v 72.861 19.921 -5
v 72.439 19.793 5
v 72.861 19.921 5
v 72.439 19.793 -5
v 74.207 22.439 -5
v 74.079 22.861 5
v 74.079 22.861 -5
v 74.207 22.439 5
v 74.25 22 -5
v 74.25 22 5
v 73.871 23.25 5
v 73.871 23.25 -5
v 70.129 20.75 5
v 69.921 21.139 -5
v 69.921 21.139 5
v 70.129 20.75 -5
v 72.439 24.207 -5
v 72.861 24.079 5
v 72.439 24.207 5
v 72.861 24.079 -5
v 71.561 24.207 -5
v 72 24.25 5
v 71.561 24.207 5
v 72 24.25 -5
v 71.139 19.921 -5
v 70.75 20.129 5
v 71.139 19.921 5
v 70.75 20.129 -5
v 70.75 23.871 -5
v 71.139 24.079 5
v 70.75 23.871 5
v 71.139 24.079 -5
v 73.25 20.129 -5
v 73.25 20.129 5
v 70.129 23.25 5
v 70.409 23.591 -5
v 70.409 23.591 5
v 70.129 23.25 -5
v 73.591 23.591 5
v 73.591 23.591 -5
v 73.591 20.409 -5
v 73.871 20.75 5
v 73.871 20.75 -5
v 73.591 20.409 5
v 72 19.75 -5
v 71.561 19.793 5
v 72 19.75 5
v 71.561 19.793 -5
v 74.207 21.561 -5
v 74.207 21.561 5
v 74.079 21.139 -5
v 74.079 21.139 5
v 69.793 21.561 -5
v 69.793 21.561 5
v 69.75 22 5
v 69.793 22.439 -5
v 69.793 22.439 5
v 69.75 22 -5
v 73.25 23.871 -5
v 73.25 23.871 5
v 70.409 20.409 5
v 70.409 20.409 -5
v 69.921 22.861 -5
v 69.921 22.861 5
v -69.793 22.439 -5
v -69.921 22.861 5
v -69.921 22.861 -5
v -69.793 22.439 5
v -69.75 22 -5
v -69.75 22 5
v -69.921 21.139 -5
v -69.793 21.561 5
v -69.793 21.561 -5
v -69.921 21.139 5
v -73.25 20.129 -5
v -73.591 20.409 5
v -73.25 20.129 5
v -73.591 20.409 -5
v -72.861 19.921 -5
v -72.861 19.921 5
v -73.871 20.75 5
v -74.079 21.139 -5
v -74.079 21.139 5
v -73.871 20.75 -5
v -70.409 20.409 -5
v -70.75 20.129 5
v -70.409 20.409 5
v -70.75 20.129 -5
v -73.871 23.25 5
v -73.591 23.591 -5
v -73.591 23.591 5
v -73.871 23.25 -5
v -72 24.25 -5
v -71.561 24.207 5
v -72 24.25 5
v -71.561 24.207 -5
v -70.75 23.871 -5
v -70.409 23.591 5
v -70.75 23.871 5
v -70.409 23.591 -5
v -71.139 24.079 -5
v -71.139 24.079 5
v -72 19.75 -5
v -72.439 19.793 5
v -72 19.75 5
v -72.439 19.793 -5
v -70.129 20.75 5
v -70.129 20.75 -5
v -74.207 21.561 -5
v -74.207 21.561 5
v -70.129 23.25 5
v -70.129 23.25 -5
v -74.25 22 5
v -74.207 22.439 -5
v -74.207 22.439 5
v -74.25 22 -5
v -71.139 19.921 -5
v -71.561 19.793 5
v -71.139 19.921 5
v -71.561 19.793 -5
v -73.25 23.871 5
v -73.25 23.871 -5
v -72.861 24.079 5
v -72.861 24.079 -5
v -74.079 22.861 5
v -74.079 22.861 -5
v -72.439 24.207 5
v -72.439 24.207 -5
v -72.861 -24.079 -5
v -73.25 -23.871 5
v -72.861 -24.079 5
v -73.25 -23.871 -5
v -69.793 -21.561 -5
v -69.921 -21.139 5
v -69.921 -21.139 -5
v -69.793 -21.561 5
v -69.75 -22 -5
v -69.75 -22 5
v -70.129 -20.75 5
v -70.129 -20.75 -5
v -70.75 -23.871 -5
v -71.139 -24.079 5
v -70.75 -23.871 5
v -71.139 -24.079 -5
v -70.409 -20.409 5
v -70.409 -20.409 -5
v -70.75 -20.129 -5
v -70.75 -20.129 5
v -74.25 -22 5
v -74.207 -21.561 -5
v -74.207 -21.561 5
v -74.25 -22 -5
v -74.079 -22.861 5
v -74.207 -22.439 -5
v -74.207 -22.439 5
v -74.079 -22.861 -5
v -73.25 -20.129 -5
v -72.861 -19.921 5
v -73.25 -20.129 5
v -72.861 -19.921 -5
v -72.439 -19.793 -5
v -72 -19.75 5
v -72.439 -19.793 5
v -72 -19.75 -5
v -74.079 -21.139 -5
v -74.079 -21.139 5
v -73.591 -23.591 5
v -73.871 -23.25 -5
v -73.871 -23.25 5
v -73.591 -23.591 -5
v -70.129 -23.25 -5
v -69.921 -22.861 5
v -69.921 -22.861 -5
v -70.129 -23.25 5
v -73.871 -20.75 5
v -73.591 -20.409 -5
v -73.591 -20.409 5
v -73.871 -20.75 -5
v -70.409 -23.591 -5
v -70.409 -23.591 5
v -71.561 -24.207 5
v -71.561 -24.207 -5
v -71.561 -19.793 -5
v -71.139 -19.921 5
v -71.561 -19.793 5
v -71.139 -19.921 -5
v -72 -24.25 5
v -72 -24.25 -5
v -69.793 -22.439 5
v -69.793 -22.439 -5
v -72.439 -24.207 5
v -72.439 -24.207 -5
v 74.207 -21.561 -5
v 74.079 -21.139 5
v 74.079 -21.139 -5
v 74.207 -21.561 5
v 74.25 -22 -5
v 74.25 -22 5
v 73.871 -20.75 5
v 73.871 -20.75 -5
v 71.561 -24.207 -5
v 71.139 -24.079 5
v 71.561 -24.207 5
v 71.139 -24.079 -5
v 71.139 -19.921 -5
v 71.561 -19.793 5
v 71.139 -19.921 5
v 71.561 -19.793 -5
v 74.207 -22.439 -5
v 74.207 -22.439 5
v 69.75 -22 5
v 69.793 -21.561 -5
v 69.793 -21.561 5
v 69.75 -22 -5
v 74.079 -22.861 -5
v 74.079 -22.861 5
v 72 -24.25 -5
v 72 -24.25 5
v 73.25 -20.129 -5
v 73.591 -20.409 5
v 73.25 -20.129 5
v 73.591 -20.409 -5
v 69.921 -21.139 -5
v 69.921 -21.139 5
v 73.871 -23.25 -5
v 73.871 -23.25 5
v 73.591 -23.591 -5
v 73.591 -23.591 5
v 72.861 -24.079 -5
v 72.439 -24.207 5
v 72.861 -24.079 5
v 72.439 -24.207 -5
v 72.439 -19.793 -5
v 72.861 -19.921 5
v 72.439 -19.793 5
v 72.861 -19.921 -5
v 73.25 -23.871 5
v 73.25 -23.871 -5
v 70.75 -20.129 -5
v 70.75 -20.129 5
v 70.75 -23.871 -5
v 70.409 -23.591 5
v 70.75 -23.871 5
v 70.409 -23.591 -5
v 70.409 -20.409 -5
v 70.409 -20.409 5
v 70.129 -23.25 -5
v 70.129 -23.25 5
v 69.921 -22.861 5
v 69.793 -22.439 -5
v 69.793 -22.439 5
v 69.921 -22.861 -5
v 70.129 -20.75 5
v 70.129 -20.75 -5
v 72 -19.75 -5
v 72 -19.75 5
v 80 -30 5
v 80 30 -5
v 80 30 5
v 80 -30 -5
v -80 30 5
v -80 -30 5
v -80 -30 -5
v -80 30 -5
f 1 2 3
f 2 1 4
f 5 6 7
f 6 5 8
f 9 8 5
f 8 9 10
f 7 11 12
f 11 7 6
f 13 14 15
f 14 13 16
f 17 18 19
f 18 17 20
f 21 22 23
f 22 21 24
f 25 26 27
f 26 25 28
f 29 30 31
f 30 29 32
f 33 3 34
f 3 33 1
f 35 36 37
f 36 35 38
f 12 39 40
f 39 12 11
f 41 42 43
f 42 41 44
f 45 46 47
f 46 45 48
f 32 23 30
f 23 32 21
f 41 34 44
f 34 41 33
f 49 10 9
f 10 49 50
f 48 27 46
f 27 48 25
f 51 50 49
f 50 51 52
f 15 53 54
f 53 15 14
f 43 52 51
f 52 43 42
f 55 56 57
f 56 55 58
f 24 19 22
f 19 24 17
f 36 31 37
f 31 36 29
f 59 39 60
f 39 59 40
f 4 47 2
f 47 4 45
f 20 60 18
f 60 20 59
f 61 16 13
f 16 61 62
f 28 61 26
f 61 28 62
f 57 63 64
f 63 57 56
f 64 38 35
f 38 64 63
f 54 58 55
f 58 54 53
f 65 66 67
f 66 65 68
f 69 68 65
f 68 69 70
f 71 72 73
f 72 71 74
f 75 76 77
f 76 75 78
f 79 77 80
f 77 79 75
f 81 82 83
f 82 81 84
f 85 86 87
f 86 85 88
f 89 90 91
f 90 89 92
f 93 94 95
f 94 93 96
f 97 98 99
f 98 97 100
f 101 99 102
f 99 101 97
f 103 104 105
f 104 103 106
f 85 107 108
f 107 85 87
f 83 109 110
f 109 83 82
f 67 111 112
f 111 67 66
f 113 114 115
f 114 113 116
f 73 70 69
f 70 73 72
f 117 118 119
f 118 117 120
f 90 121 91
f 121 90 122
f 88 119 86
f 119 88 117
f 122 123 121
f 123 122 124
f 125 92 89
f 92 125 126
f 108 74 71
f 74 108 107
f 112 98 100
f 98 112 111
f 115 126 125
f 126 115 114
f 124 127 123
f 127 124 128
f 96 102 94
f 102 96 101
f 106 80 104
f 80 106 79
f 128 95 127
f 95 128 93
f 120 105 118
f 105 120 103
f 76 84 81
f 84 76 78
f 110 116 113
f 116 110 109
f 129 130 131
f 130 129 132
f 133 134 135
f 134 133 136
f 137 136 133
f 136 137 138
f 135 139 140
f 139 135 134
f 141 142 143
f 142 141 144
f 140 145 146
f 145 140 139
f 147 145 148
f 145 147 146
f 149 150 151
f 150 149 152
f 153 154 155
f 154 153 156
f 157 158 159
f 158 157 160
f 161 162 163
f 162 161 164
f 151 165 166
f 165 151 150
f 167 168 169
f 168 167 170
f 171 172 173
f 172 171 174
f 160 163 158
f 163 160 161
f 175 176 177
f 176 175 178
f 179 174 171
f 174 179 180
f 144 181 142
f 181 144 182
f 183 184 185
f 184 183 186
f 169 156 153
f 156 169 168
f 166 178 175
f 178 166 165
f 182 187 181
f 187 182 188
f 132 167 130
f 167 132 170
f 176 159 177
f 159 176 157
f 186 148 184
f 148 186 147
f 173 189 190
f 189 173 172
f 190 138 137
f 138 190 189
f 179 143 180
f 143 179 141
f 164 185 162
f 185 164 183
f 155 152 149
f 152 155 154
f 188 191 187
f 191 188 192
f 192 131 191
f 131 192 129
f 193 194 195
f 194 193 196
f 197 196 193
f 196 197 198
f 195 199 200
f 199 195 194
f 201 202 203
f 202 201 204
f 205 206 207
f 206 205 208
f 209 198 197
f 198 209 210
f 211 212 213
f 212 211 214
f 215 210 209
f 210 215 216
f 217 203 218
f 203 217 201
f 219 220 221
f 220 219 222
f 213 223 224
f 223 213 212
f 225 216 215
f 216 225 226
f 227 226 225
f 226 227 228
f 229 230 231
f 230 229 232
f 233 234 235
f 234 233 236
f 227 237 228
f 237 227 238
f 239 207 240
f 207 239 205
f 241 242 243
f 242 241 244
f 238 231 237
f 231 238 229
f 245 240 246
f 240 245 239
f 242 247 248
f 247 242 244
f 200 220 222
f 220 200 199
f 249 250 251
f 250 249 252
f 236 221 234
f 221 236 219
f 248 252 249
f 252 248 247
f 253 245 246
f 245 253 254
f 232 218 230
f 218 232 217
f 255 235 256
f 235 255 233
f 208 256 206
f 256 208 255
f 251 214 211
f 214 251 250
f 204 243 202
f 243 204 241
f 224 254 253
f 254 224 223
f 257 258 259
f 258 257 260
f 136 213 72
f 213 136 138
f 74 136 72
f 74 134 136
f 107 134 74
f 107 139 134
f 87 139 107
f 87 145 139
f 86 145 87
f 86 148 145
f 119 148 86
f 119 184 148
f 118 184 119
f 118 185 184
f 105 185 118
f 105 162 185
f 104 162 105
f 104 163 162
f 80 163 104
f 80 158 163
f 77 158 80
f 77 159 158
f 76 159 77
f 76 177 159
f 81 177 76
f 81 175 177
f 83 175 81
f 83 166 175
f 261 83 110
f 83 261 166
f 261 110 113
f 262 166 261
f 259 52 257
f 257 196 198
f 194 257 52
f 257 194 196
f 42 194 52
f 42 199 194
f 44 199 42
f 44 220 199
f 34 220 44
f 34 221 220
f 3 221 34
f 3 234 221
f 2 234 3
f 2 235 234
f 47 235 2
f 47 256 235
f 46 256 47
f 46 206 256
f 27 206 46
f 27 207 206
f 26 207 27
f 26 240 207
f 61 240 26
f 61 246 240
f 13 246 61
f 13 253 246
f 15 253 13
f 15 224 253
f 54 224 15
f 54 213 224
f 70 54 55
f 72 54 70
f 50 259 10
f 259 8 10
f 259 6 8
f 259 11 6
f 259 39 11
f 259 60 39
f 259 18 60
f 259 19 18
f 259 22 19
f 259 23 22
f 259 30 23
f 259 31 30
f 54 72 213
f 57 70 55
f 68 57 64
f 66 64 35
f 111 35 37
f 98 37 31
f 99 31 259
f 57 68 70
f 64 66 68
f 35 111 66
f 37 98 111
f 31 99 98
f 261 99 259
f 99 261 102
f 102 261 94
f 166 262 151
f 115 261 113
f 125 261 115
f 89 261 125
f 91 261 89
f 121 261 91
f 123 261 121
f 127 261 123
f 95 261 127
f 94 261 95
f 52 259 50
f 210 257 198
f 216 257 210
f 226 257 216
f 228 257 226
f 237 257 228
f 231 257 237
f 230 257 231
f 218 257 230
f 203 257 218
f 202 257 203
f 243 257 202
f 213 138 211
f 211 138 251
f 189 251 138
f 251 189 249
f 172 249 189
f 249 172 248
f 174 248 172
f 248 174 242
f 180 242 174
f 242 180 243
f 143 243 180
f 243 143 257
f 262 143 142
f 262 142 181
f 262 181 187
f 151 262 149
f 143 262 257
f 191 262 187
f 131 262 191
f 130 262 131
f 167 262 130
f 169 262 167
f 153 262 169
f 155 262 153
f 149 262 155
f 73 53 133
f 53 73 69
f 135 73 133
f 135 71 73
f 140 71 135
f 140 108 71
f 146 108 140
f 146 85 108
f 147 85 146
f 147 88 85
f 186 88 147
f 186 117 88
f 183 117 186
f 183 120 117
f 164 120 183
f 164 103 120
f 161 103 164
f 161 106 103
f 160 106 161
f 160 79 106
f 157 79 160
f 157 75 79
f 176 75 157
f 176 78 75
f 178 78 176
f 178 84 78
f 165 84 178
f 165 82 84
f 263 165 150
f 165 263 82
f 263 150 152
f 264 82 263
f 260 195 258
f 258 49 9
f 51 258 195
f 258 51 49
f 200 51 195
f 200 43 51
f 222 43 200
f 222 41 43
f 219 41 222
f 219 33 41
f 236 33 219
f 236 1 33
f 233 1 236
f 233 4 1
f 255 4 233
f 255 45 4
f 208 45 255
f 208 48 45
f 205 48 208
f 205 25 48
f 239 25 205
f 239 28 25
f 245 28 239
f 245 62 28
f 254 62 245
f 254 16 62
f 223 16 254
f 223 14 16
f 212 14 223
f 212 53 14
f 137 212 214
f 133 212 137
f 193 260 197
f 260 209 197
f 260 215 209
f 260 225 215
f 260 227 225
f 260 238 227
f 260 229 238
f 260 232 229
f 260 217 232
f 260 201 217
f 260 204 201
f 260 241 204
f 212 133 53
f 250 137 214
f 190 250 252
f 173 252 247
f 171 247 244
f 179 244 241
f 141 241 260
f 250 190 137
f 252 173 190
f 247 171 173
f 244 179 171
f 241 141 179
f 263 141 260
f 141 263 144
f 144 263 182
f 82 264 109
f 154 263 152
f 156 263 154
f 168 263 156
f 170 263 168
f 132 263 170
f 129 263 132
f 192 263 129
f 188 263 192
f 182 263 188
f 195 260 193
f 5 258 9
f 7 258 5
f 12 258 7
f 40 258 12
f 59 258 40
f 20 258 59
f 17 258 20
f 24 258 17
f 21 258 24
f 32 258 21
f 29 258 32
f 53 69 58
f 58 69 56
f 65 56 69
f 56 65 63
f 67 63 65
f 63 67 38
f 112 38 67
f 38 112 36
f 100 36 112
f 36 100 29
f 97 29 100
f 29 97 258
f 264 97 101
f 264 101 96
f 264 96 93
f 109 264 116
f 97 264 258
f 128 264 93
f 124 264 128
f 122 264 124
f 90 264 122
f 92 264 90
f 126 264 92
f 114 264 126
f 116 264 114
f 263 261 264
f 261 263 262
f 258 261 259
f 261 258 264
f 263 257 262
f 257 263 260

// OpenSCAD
$fn = 32;

// ----------------------------------------------------------------------
// Corner plate 160 x 60 x 10
// 4 holes, centres taken from the edge offset
// ----------------------------------------------------------------------

// --- parameters (mm) ---
plate = [160, 60, 10];  // overall size (x, y, z)
holes = 4;              // number of holes the drawing asks for
hole_d = 4.5;           // hole diameter
edge = 8;               // hole centre offset from the plate edge

// --- derived feature positions (mm) ---
corner_x = plate[0] / 2 - edge;  // = 72   corner hole X
corner_y = plate[1] / 2 - edge;  // = 22   corner hole Y
feature_centers = [
  [corner_x, corner_y],
  [-corner_x, corner_y],
  [-corner_x, -corner_y],
  [corner_x, -corner_y]
];   // hole centres the loop below drills

// plate outline, every hole drilled through with the same cutters
difference() {
  cube(plate, center = true);
  for (centre = feature_centers)
    translate([centre[0], centre[1], 0])
      cylinder(d = hole_d, h = plate[2] + 2, center = true);
}
